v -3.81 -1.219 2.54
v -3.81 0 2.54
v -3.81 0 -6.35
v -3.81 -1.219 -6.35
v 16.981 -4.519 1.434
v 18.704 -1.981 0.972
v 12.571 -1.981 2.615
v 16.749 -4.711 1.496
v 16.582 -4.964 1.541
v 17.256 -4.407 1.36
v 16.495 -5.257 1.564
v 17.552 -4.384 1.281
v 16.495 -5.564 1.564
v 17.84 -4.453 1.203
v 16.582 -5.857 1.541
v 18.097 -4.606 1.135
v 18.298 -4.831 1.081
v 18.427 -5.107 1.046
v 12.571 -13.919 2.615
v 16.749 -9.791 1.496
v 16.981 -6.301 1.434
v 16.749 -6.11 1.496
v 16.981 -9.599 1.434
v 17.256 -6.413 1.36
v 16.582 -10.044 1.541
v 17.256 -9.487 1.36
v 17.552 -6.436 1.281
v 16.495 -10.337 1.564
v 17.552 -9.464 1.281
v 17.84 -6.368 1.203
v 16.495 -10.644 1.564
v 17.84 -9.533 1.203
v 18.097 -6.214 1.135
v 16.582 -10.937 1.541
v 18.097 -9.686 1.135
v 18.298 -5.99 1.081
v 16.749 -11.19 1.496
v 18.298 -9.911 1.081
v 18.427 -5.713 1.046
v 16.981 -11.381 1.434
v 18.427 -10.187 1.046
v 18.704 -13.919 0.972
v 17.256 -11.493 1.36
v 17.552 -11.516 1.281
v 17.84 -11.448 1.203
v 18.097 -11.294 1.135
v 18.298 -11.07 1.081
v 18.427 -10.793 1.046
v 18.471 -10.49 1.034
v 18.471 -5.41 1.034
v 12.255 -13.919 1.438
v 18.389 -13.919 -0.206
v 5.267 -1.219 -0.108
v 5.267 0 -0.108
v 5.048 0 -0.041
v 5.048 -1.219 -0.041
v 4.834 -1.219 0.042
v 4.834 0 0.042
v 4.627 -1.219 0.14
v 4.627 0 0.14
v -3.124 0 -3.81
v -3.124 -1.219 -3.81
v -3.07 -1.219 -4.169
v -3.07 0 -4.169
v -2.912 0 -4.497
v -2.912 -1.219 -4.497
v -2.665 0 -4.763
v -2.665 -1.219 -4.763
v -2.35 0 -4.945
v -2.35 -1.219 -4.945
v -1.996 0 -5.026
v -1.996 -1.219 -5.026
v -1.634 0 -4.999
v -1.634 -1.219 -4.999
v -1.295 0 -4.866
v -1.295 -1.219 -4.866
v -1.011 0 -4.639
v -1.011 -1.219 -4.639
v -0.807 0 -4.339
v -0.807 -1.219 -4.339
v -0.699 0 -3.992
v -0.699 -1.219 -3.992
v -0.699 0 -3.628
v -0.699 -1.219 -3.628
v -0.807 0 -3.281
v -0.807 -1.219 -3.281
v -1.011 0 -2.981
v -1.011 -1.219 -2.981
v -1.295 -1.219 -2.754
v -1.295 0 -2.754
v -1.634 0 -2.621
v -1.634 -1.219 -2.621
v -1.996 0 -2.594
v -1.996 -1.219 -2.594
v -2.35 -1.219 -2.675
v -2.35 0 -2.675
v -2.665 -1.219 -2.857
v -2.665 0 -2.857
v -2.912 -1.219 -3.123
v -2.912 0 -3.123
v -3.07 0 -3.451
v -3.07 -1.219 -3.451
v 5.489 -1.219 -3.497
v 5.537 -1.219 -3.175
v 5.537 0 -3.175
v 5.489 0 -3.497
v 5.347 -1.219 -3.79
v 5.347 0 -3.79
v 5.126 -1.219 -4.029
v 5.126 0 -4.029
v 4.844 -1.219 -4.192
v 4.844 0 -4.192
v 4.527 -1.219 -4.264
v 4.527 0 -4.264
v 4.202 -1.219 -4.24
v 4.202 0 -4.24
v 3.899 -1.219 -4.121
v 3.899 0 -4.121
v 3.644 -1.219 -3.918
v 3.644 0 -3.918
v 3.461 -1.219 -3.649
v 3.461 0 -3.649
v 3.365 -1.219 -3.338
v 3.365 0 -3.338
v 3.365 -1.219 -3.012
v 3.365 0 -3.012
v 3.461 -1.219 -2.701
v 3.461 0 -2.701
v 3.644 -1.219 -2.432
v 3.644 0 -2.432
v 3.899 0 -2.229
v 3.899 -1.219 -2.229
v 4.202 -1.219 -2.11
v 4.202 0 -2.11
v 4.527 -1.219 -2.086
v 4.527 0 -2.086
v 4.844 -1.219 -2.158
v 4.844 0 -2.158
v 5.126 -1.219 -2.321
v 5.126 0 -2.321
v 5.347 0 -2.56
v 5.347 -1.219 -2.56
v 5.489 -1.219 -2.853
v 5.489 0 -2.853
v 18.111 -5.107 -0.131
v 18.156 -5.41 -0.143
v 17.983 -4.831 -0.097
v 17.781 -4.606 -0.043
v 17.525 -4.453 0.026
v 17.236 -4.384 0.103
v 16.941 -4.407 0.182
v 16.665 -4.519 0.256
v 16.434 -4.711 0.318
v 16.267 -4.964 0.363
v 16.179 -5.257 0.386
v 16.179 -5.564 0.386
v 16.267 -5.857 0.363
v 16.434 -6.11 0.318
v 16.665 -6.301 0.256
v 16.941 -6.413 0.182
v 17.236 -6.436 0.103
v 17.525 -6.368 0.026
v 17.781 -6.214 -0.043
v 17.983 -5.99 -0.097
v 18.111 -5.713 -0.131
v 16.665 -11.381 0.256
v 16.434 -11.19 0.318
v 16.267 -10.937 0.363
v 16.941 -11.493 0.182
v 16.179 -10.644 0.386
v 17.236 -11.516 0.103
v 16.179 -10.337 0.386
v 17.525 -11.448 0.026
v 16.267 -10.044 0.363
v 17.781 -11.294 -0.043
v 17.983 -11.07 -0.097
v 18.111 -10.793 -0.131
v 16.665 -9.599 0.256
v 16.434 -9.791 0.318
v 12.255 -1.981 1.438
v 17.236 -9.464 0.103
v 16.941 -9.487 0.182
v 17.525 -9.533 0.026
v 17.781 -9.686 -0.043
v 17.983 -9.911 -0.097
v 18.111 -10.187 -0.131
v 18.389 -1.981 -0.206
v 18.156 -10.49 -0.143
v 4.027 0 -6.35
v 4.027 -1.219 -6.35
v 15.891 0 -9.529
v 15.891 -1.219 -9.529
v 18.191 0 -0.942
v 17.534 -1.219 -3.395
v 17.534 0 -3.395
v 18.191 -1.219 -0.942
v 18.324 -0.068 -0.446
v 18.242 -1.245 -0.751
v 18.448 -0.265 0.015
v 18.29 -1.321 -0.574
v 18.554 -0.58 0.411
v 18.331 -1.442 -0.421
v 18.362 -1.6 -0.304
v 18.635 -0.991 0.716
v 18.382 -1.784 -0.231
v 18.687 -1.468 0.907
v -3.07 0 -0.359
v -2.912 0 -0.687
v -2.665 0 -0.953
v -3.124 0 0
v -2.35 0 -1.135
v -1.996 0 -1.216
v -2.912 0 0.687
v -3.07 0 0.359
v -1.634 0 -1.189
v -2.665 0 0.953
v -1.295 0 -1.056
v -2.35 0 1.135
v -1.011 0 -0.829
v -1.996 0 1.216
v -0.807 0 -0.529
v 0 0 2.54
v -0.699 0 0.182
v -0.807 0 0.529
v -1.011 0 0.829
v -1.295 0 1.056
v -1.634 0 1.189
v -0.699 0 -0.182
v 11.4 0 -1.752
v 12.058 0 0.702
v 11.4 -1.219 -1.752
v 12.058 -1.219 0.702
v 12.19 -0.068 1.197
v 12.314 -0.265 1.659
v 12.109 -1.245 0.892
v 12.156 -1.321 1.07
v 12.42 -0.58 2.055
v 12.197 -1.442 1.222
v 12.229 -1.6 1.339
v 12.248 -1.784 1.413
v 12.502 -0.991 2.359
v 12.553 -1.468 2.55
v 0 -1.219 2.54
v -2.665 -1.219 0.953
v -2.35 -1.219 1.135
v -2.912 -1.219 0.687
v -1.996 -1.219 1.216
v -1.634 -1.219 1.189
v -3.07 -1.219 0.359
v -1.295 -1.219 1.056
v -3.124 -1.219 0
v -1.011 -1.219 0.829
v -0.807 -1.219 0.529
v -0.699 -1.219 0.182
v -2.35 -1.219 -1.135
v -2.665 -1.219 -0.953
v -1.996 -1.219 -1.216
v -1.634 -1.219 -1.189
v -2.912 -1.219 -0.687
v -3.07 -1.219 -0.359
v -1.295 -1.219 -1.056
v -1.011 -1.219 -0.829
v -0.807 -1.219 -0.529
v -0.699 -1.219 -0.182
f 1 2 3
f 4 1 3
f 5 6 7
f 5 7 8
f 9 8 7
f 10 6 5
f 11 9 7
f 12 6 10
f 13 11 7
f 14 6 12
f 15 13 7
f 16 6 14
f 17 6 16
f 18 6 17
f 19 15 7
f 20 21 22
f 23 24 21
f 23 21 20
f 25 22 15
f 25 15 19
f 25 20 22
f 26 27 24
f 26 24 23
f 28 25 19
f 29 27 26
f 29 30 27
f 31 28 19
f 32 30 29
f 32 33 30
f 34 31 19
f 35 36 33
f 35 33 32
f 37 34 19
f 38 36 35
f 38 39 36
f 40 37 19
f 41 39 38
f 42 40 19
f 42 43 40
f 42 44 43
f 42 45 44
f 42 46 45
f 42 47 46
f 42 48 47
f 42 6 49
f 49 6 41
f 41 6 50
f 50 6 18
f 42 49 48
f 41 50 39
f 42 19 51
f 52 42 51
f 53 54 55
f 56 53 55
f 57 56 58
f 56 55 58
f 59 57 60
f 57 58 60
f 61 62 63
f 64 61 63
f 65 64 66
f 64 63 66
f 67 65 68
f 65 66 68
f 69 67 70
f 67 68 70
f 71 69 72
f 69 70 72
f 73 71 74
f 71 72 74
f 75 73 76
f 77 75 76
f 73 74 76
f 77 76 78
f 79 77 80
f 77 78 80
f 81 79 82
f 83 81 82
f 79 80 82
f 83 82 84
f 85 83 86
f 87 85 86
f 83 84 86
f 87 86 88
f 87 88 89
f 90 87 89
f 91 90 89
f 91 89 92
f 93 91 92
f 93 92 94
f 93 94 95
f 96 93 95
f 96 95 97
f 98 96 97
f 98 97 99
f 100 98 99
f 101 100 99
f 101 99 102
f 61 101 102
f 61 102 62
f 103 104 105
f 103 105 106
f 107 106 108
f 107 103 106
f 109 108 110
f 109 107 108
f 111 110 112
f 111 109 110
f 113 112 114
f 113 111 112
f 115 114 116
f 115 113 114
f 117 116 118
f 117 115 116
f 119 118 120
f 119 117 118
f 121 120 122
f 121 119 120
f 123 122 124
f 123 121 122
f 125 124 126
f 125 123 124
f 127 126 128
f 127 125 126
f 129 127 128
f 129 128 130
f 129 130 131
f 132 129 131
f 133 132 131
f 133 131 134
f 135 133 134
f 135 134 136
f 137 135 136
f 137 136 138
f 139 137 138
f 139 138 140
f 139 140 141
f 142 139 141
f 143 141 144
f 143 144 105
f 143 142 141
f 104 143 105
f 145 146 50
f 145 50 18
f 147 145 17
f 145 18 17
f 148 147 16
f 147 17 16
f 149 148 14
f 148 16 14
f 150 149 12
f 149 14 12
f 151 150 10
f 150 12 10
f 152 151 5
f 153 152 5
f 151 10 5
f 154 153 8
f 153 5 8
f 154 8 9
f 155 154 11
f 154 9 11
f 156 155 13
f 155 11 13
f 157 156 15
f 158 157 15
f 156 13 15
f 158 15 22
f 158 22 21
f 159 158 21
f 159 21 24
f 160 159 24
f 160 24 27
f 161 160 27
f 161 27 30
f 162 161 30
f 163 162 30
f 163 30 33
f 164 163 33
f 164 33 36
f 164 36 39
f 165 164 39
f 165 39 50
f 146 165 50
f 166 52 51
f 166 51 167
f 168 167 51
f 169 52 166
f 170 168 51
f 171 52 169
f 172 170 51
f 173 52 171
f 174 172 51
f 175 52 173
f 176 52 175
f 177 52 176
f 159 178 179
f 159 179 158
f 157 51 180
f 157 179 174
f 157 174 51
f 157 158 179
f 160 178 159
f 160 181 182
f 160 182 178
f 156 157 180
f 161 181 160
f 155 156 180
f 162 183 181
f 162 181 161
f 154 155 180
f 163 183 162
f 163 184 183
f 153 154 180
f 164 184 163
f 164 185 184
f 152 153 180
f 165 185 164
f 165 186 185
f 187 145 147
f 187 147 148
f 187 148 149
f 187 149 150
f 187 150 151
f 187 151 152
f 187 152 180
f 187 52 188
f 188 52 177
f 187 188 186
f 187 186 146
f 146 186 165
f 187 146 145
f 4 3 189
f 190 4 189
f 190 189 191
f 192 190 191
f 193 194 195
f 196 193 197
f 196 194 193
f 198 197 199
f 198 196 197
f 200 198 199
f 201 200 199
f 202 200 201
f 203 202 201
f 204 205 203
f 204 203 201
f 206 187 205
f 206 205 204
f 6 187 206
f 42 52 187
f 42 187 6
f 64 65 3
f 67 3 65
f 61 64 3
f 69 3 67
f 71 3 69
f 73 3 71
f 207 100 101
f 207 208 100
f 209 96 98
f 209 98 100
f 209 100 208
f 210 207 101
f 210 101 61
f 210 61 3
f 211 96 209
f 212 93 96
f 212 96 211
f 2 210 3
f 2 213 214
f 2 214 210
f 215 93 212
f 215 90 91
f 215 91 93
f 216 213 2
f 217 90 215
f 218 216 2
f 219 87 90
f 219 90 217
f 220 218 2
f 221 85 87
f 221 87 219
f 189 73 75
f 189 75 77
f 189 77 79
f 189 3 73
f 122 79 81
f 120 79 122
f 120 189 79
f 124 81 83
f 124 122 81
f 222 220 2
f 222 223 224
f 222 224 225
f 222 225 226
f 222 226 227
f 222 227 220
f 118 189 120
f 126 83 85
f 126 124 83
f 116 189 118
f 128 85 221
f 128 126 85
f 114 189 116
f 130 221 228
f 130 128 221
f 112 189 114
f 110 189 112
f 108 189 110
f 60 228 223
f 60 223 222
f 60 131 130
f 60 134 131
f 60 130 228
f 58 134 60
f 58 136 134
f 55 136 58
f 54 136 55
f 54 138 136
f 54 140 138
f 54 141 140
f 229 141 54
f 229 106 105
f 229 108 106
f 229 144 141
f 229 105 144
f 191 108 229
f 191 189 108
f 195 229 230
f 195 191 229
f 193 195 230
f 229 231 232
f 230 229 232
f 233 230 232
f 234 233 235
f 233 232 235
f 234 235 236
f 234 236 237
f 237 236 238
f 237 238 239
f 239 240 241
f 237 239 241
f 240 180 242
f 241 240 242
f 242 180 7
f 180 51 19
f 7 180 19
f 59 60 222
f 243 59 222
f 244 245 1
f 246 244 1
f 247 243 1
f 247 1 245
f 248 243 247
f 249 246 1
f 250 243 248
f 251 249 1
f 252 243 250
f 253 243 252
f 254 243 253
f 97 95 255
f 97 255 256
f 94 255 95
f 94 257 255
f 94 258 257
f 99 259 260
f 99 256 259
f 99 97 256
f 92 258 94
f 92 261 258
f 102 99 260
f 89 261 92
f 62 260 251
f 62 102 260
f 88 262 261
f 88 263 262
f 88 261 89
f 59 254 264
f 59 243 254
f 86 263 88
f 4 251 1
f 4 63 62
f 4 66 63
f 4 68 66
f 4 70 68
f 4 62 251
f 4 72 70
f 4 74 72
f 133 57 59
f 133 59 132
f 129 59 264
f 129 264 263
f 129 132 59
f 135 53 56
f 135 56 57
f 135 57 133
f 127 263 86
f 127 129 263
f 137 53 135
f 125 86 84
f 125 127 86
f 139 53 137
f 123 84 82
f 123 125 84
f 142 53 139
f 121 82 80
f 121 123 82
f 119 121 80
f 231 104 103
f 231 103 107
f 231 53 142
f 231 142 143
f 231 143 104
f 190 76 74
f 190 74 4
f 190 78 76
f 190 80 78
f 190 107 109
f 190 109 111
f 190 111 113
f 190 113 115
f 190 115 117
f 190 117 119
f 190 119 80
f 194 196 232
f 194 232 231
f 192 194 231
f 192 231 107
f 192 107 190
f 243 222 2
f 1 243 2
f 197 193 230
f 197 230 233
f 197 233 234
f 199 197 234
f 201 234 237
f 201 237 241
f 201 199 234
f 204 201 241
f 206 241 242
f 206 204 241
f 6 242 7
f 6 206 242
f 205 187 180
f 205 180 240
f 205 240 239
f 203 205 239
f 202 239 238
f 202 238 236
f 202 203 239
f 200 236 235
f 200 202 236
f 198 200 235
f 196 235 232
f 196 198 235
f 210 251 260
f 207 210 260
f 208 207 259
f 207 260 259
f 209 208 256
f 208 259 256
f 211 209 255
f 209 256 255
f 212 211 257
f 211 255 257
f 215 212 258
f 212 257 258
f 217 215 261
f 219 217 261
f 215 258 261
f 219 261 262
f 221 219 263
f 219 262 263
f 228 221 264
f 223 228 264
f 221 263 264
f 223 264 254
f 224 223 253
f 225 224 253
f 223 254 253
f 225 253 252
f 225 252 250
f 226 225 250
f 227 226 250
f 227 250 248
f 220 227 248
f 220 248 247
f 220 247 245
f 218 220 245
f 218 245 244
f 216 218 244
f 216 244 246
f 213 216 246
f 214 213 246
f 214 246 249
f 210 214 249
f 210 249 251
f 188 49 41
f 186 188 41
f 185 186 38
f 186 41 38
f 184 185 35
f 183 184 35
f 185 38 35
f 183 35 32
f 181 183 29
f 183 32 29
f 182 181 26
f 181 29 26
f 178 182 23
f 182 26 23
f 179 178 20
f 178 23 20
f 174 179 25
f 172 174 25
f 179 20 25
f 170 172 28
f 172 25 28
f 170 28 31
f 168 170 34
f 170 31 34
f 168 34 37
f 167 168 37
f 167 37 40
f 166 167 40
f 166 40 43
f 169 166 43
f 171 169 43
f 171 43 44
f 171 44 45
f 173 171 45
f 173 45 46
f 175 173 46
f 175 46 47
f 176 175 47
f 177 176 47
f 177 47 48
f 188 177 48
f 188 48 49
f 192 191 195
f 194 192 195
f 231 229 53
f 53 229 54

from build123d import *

# Parameters (mm, degrees)
BASE_FLANGE1_DEPTH              = 1.2192
HOLE1_START                     = -1.2192
HOLE1_OUTLINE_R                 = 1.0922
HOLE1_DEPTH                     = 1.2192
EDGE_FLANGE1_DEPTH              = 6.35
F_1_CLEARANCE_HOLE2_D           = 2.0574
F_1_CLEARANCE_HOLE2_ON_FACE_2_D = 2.0574
F_2_CLEARANCE_HOLE2_D           = 2.4384


# Read off the part's stored shape, not the designer's step: Hole1
# Sheet-metal steps are written as plain solids
with BuildPart() as part:
    # Sketch1 → Base-Flange1 (new body)
    with BuildSketch(Plane(origin=(0, 0, 0), x_dir=(1, 0, 0), z_dir=(0, 1, 0))):
        with BuildLine():
            Line((4.02700332, 6.35), (15.890507526, 9.528816371))
            Line((15.890507526, 9.528816371), (17.534008462, 3.395187374))
            Line((17.534008462, 3.395187374), (5.266750468, 0.108185502))
            ThreePointArc((5.266750468, 0.108185502), (4.939943157, 0.001343981), (4.626605284, -0.140209919))
            Line((4.626605284, -0.140209919), (0, -2.54))
            Line((0, -2.54), (-3.81, -2.54))
            Line((-3.81, -2.54), (-3.81, 6.35))
            Line((-3.81, 6.35), (4.02700332, 6.35))
        make_face()
    extrude(amount=-BASE_FLANGE1_DEPTH)

    # Hole1 outline → Hole1 (cut)
    with BuildSketch(Plane(origin=(0, 0, 0), x_dir=(1, 0, 0), z_dir=(0, 1, 0)).offset(HOLE1_START)):
        with Locations((4.445, 3.175)):
            Circle(HOLE1_OUTLINE_R)
    extrude(amount=HOLE1_DEPTH, mode=Mode.SUBTRACT)

    # Edge-Flange1 section (across the edge) → Edge-Flange1 (add)
    with BuildSketch(Plane(origin=(18.388628949, -1.2192, -0.205700296), x_dir=(-0.2588190451025216, -3.4914813388431334e-15, -0.9659258262890682), z_dir=(-0.9659258262890682, 0, 0.2588190451025216))):
        with BuildLine():
            Line((-1.2192, 0.762), (-1.2192, 12.7))
            Line((-1.2192, 12.7), (0, 12.7))
            Line((0, 12.7), (0, 0.762))
            ThreePointArc((0, 0.762), (0.223184633, 0.223184633), (0.762, 0))
            Line((0.762, 0), (3.302, 0))
            Line((3.302, 0), (3.302, -1.2192))
            Line((3.302, -1.2192), (0.762, -1.2192))
            ThreePointArc((0.762, -1.2192), (-0.638919955, -0.638919955), (-1.2192, 0.762))
        make_face()
    extrude(amount=EDGE_FLANGE1_DEPTH)

    # #1 Clearance Hole2 (through all)
    with Locations(Plane(origin=(17.16190315, -10.4902, 0.122999891), x_dir=(-0.965925826289, 0, 0.258819045103), z_dir=(-0.258819045103, 0, -0.965925826289))):
        with Locations((0, 0)):
            Hole(F_1_CLEARANCE_HOLE2_D / 2)

    # #1 Clearance Hole2 on face 2 (through all)
    with Locations(Plane(origin=(17.16190315, -5.4102, 0.122999891), x_dir=(-0.965925849201, 0, 0.258818959594), z_dir=(-0.258818959594, 0, -0.965925849201))):
        with Locations((0, 0)):
            Hole(F_1_CLEARANCE_HOLE2_ON_FACE_2_D / 2)

    # #2 Clearance Hole2 (through all)
    with Locations(Plane(origin=(0, 0, 0), x_dir=(1, 0, 0), z_dir=(0, 1, 0))):
        with Locations((-1.905, 0), (-1.905, 3.81)):
            Hole(F_2_CLEARANCE_HOLE2_D / 2)


solid = part.part
